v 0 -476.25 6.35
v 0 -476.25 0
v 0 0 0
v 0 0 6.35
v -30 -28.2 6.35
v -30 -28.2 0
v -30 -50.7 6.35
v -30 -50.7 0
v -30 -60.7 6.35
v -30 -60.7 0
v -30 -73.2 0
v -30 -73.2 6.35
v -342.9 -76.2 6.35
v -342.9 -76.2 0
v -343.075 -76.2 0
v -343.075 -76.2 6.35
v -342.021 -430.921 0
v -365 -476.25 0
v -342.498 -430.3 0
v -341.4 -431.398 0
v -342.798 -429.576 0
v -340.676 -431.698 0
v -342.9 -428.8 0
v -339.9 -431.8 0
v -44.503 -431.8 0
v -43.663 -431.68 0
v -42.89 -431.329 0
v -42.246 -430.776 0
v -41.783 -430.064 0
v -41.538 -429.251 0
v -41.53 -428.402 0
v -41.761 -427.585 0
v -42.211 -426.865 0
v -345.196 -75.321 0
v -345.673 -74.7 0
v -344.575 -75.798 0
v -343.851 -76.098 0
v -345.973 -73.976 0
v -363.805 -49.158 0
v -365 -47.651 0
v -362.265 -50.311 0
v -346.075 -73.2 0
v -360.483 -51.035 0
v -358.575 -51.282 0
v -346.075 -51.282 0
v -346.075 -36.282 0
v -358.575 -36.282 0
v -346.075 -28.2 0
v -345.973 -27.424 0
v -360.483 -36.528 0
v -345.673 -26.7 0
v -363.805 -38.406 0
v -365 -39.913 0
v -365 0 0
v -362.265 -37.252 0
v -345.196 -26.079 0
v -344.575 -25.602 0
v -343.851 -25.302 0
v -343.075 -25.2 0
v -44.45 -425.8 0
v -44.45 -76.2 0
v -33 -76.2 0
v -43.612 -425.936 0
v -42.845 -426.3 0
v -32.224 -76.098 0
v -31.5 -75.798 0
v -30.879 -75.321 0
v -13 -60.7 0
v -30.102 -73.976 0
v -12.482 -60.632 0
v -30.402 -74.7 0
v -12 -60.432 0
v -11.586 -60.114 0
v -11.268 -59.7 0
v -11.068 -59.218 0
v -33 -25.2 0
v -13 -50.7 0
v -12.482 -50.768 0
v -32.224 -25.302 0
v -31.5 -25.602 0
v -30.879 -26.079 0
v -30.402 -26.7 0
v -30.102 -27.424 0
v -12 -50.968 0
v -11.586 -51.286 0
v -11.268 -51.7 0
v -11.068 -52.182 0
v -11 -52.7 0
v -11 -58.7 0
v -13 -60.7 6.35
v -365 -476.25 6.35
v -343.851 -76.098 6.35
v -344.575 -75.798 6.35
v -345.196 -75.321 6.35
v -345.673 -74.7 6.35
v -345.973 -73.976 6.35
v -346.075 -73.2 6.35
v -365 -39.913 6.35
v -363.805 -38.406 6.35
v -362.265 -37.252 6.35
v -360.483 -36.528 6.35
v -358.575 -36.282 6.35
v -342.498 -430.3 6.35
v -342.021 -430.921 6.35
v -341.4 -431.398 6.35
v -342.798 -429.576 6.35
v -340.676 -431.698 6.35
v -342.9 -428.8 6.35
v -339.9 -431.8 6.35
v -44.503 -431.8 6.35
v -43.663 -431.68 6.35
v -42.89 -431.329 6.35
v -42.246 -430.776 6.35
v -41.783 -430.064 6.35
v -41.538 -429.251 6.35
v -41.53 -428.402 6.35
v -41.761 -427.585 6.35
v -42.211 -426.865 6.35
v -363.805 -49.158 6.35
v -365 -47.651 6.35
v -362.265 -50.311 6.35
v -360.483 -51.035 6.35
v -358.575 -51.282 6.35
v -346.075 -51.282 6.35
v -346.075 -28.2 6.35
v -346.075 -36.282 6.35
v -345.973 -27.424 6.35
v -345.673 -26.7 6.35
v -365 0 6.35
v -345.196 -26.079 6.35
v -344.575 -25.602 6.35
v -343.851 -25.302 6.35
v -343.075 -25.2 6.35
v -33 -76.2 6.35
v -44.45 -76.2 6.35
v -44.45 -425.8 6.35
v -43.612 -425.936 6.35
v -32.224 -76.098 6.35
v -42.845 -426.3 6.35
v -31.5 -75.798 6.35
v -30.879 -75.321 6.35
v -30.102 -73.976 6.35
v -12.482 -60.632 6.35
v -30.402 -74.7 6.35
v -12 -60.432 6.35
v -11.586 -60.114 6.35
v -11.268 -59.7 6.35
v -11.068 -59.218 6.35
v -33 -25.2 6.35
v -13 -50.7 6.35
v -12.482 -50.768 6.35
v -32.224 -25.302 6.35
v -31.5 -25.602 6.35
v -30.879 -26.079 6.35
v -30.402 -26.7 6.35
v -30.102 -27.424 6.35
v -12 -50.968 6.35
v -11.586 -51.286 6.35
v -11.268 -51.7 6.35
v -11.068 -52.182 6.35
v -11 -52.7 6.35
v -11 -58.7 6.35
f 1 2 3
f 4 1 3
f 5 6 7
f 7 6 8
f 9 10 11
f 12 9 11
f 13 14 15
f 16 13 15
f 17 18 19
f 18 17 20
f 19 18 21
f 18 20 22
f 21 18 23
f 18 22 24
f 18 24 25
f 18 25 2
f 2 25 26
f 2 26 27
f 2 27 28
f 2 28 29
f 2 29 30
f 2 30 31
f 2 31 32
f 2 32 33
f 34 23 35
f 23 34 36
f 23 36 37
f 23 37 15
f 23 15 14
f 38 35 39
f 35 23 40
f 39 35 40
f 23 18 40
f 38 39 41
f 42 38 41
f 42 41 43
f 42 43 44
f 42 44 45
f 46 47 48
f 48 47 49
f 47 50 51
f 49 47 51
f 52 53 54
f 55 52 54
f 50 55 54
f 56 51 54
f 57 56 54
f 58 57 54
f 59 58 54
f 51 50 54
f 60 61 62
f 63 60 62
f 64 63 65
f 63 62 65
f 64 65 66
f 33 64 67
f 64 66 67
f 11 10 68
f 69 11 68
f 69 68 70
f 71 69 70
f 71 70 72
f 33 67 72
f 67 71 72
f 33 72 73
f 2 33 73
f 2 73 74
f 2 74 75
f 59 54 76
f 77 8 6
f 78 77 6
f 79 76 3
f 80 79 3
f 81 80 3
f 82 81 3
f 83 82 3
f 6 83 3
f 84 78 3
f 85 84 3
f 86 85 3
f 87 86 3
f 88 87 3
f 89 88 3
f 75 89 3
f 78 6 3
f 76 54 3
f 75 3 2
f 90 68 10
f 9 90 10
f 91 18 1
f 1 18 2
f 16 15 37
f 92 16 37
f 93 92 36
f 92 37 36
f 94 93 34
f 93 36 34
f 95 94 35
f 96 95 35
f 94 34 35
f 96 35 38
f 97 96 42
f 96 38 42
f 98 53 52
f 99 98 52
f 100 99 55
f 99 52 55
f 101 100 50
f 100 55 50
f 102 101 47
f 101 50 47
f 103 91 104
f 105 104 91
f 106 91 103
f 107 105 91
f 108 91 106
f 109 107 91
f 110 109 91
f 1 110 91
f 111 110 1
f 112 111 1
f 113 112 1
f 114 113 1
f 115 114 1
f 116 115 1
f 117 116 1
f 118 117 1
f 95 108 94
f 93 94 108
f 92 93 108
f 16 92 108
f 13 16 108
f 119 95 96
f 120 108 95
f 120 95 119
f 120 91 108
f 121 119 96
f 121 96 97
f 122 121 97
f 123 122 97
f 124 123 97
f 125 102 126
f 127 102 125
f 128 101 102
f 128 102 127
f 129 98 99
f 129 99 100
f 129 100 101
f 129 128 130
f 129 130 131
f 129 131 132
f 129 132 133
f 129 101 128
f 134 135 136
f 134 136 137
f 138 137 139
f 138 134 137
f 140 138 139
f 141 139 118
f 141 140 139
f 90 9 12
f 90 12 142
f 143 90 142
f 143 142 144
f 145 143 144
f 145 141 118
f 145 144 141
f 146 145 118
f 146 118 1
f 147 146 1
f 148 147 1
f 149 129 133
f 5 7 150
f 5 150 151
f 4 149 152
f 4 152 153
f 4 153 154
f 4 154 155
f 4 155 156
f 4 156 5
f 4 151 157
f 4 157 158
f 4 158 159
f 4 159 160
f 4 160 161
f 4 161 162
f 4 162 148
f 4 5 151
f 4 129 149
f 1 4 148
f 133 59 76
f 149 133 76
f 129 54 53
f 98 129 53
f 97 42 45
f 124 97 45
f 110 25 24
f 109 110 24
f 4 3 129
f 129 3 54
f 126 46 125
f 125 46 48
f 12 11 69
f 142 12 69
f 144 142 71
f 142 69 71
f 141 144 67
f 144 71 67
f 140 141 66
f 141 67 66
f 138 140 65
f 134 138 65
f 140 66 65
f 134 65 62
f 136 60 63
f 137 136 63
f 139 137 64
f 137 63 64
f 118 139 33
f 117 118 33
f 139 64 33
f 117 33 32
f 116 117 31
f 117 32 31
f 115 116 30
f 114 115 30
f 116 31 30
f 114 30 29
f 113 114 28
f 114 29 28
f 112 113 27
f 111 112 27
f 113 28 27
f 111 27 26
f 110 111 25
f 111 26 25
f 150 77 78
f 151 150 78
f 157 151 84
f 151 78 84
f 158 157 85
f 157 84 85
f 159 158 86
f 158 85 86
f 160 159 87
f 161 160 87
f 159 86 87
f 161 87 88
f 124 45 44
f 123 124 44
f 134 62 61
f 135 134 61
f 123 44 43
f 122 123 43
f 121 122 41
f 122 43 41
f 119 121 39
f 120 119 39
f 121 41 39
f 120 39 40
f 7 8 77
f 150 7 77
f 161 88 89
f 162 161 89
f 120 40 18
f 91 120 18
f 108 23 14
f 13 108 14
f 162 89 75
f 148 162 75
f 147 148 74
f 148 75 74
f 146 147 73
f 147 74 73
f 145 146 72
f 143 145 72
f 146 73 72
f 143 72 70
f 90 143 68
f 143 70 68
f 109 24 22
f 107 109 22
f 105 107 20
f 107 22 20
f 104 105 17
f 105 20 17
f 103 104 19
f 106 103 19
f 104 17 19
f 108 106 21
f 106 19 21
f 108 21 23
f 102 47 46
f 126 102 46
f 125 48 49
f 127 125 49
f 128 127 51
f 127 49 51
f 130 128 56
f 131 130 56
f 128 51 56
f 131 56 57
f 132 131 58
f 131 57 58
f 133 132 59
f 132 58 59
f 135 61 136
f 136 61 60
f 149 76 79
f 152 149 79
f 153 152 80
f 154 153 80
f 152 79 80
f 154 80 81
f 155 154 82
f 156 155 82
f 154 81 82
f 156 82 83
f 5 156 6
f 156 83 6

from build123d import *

# Parameters (mm, degrees)
F1_DEPTH = 6.35


with BuildPart() as f1:
    # F0 (on Top) → F1 (new body)
    with BuildSketch(Plane.XY):
        with BuildLine():
            Line((0, -107.95), (0, 0))
            Line((0, 0), (-365, 0))
            Line((-365, 0), (-365, -39.912774))
            ThreePointArc((-365, -39.912774), (-362.265006, -37.252341), (-358.575, -36.281802))
            Line((-358.575, -36.281802), (-346.075, -36.281802))
            Line((-346.075, -36.281802), (-346.075, -28.2))
            ThreePointArc((-346.075, -28.2), (-345.19632, -26.07868), (-343.075, -25.2))
            Line((-343.075, -25.2), (-33, -25.2))
            ThreePointArc((-33, -25.2), (-30.87868, -26.07868), (-30, -28.2))
            Line((-30, -28.2), (-30, -50.7))
            Line((-30, -50.7), (-13, -50.7))
            ThreePointArc((-13, -50.7), (-11.585786, -51.285786), (-11, -52.7))
            Line((-11, -52.7), (-11, -58.7))
            ThreePointArc((-11, -58.7), (-11.585786, -60.114214), (-13, -60.7))
            Line((-13, -60.7), (-30, -60.7))
            Line((-30, -60.7), (-30, -73.2))
            ThreePointArc((-30, -73.2), (-30.87868, -75.32132), (-33, -76.2))
            Line((-33, -76.2), (-44.45, -76.2))
            Line((-44.45, -76.2), (-44.45, -425.800476))
            ThreePointArc((-44.45, -425.800476), (-41.503539, -428.826711), (-44.50342, -431.8))
            Line((-44.50342, -431.8), (-339.9, -431.8))
            ThreePointArc((-339.9, -431.8), (-342.02132, -430.92132), (-342.9, -428.8))
            Line((-342.9, -428.8), (-342.9, -107.95))
            Line((-342.9, -107.95), (-342.9, -76.2))
            Line((-342.9, -76.2), (-343.075, -76.2))
            ThreePointArc((-343.075, -76.2), (-345.19632, -75.32132), (-346.075, -73.2))
            Line((-346.075, -73.2), (-346.075, -51.281802))
            Line((-346.075, -51.281802), (-358.575, -51.281802))
            ThreePointArc((-358.575, -51.281802), (-362.265006, -50.311262), (-365, -47.650829))
            Line((-365, -47.650829), (-365, -107.95))
            Line((-365, -107.95), (-365, -476.25))
            Line((-365, -476.25), (0, -476.25))
            Line((0, -476.25), (0, -107.95))
        make_face()
    extrude(amount=F1_DEPTH)


solid = f1.part
